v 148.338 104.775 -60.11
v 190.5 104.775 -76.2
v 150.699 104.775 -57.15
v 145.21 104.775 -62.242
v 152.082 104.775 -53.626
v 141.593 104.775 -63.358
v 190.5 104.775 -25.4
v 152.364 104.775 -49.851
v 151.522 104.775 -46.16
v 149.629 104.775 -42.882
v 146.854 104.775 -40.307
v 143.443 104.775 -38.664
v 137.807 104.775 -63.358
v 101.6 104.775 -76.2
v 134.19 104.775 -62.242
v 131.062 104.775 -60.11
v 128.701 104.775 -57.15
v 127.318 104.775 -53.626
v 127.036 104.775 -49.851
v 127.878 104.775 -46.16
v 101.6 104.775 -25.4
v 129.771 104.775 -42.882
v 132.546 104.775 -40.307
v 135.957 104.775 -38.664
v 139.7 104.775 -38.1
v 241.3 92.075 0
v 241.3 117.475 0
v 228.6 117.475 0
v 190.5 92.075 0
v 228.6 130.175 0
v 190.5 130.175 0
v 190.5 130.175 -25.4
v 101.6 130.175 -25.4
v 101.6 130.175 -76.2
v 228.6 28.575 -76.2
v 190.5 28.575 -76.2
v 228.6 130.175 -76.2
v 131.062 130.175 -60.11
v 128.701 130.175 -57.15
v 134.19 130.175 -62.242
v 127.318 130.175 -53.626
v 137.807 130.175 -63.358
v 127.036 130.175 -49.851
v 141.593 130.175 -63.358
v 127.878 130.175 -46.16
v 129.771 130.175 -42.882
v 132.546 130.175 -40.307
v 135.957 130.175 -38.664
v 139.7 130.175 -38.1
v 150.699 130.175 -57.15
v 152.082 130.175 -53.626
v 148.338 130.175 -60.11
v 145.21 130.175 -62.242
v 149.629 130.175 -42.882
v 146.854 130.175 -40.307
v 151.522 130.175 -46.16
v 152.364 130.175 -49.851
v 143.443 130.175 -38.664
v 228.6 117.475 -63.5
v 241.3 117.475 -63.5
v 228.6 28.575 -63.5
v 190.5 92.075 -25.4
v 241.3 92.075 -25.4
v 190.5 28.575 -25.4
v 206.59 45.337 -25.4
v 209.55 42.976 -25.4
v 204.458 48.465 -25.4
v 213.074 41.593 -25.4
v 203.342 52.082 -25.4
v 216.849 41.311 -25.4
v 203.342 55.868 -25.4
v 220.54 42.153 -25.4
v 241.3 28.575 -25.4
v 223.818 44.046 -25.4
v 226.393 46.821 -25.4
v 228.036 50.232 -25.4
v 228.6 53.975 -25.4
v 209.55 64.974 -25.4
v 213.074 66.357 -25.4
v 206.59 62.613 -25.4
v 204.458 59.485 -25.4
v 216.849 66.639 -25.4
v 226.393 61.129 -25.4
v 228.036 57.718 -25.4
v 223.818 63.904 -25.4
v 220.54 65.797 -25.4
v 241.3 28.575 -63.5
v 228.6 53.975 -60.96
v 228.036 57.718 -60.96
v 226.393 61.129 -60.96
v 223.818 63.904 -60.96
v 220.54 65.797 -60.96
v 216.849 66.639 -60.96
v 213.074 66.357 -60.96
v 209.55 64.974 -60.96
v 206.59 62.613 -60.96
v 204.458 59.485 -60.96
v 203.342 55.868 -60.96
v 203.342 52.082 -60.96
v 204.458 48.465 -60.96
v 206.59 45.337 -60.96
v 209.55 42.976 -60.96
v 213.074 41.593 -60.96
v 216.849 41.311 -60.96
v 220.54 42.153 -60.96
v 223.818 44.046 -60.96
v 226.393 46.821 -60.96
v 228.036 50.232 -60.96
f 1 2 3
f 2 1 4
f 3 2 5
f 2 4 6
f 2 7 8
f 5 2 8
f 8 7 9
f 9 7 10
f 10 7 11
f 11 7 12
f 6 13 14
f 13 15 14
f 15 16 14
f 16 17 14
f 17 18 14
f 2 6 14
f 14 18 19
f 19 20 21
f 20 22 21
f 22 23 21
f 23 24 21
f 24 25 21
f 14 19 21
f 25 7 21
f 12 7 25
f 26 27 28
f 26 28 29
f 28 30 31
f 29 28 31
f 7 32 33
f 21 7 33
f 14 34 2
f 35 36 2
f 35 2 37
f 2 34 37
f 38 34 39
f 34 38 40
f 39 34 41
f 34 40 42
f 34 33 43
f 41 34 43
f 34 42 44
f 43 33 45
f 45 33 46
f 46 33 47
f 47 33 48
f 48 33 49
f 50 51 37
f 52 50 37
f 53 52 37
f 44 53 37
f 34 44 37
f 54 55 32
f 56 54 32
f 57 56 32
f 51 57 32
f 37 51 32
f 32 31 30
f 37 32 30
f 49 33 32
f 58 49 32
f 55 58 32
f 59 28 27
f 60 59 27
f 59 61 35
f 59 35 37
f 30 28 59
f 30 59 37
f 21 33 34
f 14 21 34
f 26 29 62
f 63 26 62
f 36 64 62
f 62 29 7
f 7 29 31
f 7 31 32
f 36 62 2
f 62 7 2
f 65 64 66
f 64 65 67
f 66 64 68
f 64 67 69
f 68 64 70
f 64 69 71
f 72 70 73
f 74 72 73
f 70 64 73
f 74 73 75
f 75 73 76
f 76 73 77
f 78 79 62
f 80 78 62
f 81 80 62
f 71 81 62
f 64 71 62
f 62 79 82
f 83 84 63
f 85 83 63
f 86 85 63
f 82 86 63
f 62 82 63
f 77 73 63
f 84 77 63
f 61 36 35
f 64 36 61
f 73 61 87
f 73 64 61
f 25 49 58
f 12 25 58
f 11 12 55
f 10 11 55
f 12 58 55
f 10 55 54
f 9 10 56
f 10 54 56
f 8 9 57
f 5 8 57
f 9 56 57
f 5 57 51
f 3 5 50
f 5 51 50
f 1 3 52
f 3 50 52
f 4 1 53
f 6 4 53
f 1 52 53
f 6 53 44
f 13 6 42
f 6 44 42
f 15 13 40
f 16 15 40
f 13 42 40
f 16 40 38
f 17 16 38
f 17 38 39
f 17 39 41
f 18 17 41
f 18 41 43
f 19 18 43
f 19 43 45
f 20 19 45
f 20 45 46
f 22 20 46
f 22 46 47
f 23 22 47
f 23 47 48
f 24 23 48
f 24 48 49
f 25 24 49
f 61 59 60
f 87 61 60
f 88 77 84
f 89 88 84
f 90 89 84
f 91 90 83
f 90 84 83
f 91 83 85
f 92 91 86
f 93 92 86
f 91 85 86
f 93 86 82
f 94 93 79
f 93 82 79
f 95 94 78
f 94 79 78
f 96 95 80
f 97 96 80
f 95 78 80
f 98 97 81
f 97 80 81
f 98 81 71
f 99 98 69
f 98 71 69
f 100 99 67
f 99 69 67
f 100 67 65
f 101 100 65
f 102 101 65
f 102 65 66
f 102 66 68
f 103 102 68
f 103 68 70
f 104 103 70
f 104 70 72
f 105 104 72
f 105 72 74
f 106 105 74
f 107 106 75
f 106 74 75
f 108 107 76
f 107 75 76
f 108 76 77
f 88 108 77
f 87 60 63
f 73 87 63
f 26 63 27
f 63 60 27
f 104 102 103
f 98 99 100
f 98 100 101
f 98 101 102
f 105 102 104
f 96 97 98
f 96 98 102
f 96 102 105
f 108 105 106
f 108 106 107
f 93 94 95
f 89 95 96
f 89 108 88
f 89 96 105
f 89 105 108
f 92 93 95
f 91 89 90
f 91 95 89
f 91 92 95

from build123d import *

# Parameters (mm, degrees)
BOSS_EXTRUDE1_DEPTH = 101.6
SKETCH6_R           = 12.7
CUT_EXTRUDE1_DEPTH  = 273.680564031
CUT_EXTRUDE5_DEPTH  = 285.565740427
SKETCH10_W          = 12.7
SKETCH10_H          = 12.7
CUT_EXTRUDE6_DEPTH  = 285.565740427
SKETCH11_W          = 25.4
SKETCH11_H          = 63.5
CUT_EXTRUDE7_DEPTH  = 206.591976072
CUT_EXTRUDE10_START = -25.4
SKETCH12_R          = 12.7
CUT_EXTRUDE10_DEPTH = 35.56


with BuildPart() as part:
    # Sketch5 → Boss-Extrude1 (new body)
    with BuildSketch(Plane(origin=(0, 130.175, 0), x_dir=(-1, 0, 0), z_dir=(0, 1, 0))):
        Polygon((-241.3, 0), (-190.5, 0), (-190.5, -25.4), (-101.6, -25.4), (-101.6, -76.2), (-228.6, -76.2), (-228.6, -63.5), (-241.3, -63.5), align=None)
    extrude(amount=-BOSS_EXTRUDE1_DEPTH)

    # Sketch6 → Cut-Extrude1 (cut, through all)
    with BuildSketch(Plane(origin=(0, 130.175, 0), x_dir=(-1, 0, 0), z_dir=(0, 1, 0))):
        with Locations(Location((-139.7, -50.8, 0), (0, 0, 90))):
            Circle(SKETCH6_R)
    extrude(amount=-CUT_EXTRUDE1_DEPTH, mode=Mode.SUBTRACT)

    # Sketch8 → Cut-Extrude5 (cut, through all)
    with BuildSketch(Plane.XY):
        Polygon((190.5, 104.775), (139.7, 104.775), (127, 104.775), (101.6, 104.775), (101.6, 28.575), (190.5, 28.575), (190.5, 92.075), align=None)
    extrude(amount=-CUT_EXTRUDE5_DEPTH, mode=Mode.SUBTRACT)

    # Sketch10 → Cut-Extrude6 (cut, through all)
    with BuildSketch(Plane.XY):
        with Locations((234.95, 123.825)):
            Rectangle(SKETCH10_W, SKETCH10_H)
    extrude(amount=-CUT_EXTRUDE6_DEPTH, mode=Mode.SUBTRACT)

    # Sketch11 → Cut-Extrude7 (cut, through all)
    with BuildSketch(Plane(origin=(241.3, 0, 0), x_dir=(0, 0, -1), z_dir=(1, 0, 0))):
        with Locations((12.7, 60.325)):
            Rectangle(SKETCH11_W, SKETCH11_H)
    extrude(amount=-CUT_EXTRUDE7_DEPTH, mode=Mode.SUBTRACT)

    # Sketch12 → Cut-Extrude10 (cut)
    with BuildSketch(Plane.XY.offset(CUT_EXTRUDE10_START)):
        with Locations((215.9, 53.975)):
            Circle(SKETCH12_R)
    extrude(amount=-CUT_EXTRUDE10_DEPTH, mode=Mode.SUBTRACT)


solid = part.part
